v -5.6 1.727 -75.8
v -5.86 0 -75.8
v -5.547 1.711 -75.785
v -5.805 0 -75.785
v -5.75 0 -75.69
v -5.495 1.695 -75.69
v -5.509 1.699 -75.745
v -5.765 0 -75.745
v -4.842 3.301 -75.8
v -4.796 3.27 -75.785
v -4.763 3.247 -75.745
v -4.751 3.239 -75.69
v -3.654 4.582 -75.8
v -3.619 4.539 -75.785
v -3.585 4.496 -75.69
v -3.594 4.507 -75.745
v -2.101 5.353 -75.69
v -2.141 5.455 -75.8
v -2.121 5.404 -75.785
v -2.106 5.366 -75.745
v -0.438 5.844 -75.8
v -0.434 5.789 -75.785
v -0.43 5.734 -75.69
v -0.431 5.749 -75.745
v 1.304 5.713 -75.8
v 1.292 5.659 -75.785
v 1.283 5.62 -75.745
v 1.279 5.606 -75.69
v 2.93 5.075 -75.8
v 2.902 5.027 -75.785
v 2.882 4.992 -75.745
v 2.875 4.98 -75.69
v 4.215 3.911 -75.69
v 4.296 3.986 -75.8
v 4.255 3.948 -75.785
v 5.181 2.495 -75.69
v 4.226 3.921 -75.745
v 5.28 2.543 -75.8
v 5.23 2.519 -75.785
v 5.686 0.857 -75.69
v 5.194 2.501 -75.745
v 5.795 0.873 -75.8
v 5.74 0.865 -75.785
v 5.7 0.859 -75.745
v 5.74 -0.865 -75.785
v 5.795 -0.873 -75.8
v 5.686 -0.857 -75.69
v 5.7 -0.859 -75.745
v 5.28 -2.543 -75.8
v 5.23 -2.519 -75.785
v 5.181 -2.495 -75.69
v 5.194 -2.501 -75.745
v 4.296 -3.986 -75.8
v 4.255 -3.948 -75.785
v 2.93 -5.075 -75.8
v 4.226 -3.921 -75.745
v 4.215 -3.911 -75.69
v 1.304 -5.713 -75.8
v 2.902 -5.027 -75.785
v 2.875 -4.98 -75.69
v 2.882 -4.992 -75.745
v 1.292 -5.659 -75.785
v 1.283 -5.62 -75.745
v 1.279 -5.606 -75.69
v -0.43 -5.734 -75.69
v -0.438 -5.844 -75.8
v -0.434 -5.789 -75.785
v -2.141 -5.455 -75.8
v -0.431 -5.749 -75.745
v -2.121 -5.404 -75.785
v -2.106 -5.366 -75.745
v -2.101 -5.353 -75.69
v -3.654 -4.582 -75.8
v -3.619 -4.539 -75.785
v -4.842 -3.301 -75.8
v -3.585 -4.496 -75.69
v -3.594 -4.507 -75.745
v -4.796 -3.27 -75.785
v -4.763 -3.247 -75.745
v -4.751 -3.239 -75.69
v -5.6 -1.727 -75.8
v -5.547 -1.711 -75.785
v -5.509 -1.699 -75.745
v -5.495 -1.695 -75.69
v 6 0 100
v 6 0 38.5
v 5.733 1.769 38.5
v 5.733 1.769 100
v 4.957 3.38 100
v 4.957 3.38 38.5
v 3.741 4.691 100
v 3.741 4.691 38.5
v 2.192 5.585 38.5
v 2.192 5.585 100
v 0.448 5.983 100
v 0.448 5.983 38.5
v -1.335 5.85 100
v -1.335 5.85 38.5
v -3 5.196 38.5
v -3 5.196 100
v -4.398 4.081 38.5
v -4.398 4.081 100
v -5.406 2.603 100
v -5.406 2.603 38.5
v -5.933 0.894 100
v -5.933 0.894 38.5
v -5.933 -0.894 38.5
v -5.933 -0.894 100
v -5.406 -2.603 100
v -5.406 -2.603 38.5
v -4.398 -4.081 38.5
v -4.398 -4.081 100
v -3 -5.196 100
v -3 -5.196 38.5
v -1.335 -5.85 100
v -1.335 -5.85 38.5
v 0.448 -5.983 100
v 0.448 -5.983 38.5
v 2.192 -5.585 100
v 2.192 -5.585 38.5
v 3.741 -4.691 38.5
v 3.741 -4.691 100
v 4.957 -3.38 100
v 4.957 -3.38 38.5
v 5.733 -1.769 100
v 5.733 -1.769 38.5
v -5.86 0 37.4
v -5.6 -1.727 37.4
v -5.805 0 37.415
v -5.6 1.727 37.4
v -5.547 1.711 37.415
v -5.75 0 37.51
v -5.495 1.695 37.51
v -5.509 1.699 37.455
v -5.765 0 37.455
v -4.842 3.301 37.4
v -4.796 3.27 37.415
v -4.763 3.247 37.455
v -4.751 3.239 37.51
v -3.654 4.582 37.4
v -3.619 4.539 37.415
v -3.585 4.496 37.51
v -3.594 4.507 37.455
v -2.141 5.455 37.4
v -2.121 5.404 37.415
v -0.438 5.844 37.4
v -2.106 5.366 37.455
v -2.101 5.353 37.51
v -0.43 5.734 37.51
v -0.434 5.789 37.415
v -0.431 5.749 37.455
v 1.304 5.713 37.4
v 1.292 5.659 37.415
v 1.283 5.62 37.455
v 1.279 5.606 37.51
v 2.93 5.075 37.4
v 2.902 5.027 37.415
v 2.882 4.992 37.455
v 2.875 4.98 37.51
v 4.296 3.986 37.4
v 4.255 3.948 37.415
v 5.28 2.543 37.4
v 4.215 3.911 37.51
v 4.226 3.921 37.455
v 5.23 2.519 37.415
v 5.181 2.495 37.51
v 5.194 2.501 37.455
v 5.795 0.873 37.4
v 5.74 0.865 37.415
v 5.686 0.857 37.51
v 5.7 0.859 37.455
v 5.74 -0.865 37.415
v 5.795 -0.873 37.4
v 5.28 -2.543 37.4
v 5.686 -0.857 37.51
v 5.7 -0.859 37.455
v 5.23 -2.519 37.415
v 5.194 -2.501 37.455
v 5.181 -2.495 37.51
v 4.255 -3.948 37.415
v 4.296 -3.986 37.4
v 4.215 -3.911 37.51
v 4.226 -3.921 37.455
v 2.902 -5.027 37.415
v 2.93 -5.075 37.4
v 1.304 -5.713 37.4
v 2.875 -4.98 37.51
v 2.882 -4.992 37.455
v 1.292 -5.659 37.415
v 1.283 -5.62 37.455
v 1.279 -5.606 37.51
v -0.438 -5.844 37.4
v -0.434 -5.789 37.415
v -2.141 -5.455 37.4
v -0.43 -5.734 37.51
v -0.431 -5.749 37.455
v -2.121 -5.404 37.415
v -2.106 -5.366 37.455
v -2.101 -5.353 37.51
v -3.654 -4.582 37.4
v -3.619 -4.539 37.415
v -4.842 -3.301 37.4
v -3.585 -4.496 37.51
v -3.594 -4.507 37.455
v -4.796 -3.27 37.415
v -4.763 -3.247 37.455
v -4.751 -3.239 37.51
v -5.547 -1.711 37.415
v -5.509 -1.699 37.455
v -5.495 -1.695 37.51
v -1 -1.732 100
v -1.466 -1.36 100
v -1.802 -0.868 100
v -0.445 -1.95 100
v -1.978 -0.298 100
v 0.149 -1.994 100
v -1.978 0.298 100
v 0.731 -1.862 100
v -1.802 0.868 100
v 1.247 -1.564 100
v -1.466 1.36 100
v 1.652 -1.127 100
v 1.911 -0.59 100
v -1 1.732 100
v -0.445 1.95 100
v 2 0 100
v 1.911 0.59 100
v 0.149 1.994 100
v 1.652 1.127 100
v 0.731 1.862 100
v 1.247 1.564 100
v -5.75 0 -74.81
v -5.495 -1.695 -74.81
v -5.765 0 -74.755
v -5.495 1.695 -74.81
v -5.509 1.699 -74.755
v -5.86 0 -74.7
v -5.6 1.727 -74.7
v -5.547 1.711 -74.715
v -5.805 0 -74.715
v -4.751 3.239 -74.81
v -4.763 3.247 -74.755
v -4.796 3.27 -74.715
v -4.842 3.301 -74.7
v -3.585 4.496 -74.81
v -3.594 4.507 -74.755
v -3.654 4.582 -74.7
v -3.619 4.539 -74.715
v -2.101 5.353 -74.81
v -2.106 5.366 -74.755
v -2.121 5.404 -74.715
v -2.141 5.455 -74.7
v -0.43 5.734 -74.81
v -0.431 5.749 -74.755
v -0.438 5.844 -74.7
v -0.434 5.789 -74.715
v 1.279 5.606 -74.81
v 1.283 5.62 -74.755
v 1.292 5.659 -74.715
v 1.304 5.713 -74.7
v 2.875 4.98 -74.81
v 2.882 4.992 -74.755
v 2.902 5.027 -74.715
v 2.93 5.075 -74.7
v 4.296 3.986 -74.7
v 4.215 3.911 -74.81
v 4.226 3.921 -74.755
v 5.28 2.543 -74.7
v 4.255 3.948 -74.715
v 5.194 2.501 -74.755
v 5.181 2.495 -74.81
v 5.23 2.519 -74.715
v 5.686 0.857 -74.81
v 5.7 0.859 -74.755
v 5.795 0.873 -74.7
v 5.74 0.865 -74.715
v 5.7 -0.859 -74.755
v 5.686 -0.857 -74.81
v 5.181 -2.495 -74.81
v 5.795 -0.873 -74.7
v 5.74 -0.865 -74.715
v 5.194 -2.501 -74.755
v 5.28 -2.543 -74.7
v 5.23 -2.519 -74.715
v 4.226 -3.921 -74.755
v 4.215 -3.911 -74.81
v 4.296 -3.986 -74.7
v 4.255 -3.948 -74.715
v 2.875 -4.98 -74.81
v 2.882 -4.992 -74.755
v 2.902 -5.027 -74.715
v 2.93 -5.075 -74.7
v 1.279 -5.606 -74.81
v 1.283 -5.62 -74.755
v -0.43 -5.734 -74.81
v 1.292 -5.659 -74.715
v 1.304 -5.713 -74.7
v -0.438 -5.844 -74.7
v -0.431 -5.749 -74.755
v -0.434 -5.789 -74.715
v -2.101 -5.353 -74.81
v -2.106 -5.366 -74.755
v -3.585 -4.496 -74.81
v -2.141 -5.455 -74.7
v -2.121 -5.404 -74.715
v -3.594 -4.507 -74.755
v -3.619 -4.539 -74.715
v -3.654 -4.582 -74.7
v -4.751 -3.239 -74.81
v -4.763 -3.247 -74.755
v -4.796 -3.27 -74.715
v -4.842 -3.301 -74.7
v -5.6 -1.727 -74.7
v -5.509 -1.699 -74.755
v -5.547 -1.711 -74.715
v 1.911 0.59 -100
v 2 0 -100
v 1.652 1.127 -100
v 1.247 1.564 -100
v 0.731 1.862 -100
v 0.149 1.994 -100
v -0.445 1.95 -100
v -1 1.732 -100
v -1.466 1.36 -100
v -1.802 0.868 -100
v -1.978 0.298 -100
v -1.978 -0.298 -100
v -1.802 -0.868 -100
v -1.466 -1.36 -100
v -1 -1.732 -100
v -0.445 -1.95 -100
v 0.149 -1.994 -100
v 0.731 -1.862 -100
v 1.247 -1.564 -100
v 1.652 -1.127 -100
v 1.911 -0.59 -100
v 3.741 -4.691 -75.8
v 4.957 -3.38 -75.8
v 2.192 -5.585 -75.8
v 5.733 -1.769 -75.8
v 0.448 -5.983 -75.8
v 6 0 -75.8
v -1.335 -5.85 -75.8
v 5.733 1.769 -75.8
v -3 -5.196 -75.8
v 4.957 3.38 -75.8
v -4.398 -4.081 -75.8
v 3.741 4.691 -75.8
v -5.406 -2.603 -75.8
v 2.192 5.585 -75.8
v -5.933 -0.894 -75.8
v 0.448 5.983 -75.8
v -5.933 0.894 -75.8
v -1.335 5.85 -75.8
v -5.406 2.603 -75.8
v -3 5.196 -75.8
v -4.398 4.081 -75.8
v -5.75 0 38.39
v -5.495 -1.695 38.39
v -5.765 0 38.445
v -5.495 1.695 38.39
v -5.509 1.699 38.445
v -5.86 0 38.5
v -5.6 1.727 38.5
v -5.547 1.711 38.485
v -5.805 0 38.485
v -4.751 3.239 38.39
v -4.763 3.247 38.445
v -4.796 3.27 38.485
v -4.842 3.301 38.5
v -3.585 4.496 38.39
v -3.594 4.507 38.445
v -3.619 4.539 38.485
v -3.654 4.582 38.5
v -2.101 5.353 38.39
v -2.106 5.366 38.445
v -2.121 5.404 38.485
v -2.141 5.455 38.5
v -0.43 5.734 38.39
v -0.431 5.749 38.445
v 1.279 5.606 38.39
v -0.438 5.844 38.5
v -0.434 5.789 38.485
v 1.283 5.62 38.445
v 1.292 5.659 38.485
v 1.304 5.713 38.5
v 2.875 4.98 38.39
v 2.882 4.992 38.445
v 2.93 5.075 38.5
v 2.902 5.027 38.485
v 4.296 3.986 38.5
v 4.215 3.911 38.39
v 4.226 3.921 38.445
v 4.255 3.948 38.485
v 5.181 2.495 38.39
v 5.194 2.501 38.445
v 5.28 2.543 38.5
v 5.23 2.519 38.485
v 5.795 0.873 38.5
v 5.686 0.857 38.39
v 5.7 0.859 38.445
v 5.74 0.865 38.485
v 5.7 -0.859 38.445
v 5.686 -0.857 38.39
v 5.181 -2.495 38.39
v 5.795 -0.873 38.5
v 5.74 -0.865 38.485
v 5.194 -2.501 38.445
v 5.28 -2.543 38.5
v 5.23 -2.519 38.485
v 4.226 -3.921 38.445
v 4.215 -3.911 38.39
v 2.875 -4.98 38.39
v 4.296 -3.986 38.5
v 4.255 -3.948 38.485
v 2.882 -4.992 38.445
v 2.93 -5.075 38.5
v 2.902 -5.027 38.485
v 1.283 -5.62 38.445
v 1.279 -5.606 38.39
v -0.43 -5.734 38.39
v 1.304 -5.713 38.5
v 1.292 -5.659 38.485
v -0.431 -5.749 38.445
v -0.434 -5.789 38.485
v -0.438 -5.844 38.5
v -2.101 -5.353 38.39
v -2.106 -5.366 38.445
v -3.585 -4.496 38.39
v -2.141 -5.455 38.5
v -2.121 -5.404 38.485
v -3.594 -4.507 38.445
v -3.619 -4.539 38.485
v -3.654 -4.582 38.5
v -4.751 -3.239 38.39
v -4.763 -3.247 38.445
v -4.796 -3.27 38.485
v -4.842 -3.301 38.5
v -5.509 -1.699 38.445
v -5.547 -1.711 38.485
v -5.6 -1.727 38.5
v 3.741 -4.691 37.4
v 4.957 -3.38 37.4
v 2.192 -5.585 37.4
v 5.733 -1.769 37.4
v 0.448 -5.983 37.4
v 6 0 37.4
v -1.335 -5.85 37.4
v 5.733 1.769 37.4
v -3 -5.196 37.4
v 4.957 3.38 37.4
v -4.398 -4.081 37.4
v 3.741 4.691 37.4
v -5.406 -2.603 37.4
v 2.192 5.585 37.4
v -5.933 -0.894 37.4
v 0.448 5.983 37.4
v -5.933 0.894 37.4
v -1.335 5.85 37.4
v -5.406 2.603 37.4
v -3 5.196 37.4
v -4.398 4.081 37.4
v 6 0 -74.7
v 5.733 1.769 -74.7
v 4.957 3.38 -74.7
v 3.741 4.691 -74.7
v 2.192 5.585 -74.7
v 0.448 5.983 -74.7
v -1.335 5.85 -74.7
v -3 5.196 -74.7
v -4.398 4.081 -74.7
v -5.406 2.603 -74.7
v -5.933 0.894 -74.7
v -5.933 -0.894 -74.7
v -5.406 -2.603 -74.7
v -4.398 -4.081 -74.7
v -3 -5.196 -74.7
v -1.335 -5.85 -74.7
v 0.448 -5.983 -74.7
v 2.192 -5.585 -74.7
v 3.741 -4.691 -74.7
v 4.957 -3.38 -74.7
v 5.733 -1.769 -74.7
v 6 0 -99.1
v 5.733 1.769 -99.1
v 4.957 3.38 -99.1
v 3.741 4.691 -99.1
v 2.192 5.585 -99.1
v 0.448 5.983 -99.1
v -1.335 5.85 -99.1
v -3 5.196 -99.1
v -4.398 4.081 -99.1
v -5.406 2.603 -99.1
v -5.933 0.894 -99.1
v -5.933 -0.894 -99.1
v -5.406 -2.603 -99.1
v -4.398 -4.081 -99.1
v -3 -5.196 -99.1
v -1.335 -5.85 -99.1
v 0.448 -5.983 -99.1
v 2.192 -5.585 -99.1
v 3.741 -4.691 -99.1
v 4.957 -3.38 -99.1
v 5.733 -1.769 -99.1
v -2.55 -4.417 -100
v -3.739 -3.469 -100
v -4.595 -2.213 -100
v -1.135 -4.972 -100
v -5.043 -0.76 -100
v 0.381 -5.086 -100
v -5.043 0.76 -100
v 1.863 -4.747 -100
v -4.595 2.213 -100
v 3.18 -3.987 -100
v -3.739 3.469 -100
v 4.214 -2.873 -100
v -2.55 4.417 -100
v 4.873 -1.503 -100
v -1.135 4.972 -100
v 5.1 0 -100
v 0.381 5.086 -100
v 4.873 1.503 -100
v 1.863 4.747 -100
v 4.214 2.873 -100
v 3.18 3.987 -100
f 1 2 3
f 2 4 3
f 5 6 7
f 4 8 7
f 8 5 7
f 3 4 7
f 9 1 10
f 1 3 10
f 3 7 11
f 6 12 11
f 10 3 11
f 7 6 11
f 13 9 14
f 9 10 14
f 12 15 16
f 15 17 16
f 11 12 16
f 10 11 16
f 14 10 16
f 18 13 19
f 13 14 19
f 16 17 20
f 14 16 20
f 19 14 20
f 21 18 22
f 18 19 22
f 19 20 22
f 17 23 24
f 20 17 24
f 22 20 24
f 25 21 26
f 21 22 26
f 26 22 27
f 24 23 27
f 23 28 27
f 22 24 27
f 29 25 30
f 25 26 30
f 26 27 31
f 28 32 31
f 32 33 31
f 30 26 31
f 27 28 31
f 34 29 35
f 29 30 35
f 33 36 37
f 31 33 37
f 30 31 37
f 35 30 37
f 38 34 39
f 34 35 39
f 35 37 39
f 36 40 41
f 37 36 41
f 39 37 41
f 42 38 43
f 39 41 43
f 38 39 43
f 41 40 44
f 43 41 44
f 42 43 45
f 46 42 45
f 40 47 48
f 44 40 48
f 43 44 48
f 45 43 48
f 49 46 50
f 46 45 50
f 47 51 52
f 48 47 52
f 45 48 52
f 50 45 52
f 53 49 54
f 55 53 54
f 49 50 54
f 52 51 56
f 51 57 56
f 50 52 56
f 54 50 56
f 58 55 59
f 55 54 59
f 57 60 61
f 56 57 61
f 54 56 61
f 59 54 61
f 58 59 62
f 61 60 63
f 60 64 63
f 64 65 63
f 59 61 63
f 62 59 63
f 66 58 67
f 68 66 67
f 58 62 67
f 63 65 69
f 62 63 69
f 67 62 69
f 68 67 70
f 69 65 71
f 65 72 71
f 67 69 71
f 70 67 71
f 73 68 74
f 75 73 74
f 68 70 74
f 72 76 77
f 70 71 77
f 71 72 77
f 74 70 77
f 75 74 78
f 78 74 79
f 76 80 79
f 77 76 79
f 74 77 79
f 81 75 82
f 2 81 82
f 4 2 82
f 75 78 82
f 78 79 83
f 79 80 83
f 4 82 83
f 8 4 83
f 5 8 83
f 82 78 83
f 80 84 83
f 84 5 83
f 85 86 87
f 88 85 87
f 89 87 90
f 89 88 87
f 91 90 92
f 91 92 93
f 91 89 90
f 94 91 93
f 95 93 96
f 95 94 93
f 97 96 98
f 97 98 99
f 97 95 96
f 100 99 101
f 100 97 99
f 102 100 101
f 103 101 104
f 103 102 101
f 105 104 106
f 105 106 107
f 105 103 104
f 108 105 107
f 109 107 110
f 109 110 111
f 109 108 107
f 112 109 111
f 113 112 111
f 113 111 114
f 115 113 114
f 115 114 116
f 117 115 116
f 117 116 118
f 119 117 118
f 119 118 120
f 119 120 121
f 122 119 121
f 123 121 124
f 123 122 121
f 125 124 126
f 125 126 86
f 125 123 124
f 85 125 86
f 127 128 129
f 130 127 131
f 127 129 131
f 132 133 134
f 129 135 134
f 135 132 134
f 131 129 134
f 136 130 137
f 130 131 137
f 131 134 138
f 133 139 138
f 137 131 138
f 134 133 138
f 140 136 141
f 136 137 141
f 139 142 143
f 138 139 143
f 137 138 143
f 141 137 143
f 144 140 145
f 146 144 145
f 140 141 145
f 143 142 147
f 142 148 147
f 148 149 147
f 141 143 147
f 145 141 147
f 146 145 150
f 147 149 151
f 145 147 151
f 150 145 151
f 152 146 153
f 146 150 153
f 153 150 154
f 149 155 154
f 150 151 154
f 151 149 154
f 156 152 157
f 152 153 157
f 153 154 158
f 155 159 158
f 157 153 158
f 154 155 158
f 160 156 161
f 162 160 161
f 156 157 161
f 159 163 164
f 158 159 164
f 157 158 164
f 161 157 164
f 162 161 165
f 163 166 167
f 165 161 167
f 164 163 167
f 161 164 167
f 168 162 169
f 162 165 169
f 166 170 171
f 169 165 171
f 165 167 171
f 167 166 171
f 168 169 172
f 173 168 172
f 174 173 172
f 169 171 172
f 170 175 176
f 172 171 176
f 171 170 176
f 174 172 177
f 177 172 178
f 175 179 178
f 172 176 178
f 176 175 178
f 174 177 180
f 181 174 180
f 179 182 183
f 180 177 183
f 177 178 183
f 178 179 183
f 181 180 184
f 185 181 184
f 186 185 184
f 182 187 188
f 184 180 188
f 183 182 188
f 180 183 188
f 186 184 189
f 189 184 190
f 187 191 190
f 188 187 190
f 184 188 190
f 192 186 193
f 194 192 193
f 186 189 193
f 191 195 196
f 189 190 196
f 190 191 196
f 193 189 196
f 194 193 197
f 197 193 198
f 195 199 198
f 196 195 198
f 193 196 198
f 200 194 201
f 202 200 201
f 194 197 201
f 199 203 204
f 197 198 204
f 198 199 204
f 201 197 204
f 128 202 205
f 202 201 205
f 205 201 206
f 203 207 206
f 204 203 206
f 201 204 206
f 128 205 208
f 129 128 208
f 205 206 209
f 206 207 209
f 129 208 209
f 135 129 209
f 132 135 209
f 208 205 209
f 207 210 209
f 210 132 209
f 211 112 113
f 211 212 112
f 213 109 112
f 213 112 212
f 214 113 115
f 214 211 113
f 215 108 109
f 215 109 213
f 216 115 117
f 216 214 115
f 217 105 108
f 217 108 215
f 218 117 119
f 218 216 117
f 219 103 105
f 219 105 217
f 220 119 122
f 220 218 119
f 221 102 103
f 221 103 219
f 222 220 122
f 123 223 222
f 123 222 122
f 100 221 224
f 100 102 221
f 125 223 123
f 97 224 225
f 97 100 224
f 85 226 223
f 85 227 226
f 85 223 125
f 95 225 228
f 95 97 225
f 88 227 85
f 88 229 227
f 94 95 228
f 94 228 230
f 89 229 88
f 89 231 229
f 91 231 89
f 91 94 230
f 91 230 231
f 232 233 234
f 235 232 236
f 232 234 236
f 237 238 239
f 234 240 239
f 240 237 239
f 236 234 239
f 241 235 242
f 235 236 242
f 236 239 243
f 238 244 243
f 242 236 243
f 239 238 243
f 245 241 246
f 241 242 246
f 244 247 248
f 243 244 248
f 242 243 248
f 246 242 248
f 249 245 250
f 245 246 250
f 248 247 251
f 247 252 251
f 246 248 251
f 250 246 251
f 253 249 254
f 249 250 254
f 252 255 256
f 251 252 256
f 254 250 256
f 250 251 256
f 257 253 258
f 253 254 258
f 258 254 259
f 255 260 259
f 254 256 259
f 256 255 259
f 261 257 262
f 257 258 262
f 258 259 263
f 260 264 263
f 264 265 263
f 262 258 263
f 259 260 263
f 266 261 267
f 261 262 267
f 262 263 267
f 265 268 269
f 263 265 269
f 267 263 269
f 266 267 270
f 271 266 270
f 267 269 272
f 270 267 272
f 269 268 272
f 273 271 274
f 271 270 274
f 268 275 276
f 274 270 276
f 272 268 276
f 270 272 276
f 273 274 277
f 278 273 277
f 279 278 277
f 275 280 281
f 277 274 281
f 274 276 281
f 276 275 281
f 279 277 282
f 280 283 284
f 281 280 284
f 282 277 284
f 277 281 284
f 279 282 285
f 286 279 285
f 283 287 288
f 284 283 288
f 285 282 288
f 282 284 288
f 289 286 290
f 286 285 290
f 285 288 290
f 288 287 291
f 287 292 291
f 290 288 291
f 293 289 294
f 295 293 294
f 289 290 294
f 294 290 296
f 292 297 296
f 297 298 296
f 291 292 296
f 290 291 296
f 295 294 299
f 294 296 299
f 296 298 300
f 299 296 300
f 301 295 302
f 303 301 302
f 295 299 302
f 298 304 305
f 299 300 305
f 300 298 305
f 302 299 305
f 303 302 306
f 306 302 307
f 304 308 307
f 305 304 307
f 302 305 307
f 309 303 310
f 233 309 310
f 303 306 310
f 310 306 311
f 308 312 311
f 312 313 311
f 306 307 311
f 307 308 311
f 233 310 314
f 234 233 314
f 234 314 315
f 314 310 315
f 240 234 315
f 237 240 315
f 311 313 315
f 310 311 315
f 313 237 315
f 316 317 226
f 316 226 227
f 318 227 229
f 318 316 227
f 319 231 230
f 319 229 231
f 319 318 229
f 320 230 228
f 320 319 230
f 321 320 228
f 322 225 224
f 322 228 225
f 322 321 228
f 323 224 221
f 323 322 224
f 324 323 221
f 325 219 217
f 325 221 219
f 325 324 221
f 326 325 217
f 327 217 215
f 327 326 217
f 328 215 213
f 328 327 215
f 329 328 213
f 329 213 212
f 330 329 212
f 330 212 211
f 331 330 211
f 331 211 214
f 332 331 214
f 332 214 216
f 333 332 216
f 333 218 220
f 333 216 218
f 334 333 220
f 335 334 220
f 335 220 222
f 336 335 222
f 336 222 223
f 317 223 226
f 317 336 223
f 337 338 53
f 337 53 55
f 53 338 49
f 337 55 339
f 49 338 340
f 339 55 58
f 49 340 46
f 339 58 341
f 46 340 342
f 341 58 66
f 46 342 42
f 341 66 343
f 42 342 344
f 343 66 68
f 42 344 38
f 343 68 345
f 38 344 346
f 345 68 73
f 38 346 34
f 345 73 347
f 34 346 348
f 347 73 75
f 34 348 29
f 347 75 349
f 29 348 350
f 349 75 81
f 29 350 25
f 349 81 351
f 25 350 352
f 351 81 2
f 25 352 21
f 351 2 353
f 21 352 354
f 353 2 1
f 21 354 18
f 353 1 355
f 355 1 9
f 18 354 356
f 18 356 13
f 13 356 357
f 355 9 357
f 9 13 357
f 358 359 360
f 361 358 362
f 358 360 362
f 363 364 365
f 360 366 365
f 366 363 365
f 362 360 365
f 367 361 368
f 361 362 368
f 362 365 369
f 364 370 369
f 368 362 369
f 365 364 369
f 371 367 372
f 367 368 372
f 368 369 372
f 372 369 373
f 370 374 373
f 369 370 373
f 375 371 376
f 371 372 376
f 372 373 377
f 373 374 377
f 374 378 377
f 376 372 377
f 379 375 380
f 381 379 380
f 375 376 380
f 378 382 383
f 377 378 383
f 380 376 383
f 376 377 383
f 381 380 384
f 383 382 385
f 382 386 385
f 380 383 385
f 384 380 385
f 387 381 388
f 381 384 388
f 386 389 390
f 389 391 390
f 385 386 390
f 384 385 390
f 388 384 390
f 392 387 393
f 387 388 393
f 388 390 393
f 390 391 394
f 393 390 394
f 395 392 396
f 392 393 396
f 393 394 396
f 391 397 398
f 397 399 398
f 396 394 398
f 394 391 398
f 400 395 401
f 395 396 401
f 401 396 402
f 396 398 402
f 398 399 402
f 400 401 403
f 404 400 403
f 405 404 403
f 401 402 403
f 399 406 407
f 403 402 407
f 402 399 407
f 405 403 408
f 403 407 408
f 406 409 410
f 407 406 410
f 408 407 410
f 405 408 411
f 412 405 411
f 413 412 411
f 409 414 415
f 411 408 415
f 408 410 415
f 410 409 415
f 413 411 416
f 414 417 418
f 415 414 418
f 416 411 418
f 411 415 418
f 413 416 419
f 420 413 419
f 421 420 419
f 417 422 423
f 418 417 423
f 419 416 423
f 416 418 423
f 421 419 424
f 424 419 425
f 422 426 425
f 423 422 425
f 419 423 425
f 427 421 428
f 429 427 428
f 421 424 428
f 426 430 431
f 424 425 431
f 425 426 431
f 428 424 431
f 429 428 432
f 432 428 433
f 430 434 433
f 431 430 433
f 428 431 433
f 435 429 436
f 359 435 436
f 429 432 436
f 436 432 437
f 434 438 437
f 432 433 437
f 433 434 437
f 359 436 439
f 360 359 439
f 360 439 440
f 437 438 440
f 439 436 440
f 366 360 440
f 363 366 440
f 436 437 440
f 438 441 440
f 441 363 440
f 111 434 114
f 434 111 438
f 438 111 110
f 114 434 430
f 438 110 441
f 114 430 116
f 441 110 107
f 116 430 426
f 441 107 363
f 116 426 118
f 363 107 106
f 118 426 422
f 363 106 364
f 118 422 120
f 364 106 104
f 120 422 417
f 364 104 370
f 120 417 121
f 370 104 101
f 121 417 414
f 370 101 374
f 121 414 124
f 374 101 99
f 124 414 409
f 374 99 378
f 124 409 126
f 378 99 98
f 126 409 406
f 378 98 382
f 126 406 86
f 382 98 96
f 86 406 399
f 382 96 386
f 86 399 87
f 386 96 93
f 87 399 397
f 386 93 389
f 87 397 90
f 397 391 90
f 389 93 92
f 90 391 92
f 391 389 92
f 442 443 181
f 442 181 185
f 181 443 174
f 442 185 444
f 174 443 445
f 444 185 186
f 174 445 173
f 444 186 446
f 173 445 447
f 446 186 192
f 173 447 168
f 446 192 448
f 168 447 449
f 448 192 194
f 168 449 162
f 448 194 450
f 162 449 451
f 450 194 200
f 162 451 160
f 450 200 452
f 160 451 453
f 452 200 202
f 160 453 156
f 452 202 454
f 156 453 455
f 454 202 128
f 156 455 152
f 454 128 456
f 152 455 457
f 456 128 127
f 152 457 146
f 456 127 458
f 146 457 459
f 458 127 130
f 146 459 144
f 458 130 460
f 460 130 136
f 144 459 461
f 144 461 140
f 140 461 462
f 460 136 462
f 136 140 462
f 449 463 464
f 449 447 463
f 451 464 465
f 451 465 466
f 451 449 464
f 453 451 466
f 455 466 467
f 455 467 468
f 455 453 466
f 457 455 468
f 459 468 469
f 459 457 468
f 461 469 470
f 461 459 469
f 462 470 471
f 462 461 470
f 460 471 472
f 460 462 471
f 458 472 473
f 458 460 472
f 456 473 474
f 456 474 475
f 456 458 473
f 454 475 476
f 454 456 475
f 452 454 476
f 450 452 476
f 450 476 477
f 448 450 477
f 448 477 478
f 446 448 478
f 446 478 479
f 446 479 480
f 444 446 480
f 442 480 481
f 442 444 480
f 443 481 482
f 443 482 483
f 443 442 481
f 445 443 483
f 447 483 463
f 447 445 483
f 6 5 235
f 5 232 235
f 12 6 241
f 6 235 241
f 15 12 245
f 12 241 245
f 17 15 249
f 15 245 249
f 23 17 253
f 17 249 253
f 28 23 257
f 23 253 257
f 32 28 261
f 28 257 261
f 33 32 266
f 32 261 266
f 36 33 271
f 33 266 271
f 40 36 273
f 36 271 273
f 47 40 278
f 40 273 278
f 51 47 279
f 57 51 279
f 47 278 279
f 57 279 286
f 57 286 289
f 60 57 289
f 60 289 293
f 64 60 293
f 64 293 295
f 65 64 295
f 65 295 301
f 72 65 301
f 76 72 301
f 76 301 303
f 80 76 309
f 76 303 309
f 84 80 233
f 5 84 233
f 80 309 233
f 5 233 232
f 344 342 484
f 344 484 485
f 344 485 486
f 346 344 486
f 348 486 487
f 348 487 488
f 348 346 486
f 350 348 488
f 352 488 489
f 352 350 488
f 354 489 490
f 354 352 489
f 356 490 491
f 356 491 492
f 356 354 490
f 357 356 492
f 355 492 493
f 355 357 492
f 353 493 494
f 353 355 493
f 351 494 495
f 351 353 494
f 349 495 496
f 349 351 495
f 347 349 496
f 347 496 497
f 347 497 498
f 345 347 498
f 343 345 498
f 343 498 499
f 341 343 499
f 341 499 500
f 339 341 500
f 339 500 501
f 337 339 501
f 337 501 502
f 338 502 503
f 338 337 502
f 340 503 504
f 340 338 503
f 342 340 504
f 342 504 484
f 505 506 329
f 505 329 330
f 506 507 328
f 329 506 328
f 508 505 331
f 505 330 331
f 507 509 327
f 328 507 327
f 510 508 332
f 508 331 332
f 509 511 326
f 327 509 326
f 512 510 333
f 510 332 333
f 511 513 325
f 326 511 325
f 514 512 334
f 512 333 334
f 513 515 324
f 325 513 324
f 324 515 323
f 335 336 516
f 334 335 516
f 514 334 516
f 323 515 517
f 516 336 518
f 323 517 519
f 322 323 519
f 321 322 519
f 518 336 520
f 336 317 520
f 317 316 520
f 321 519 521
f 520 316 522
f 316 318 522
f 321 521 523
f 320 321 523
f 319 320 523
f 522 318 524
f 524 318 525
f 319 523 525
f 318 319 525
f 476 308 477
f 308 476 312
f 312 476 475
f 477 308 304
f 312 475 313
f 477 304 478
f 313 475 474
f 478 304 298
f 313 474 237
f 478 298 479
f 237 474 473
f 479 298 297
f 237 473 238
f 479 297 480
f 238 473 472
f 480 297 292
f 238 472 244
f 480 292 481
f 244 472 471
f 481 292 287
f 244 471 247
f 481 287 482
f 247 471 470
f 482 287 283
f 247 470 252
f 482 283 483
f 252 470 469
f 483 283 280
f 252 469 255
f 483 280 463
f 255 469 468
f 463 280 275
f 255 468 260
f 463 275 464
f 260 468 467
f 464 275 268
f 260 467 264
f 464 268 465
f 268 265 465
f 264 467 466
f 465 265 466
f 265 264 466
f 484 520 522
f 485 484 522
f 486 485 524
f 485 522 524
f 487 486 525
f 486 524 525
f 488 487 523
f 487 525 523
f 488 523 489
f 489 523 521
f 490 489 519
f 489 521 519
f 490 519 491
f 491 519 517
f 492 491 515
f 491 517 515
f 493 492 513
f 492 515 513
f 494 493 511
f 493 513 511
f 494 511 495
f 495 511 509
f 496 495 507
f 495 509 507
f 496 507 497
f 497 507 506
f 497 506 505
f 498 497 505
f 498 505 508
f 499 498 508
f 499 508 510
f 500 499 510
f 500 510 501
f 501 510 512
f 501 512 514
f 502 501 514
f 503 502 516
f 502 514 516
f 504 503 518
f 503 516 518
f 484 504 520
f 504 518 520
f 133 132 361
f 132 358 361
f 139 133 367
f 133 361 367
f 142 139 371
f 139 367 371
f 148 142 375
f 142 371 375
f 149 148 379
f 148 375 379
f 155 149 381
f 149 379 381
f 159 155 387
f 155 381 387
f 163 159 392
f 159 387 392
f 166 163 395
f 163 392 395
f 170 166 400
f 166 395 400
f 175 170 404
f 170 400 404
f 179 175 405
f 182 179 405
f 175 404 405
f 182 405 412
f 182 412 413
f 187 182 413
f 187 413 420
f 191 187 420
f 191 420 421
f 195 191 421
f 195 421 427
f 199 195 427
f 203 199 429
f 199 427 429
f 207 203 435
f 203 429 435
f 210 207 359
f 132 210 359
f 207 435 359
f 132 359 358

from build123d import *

# Parameters (mm, degrees)
SKETCH1_R           = 6
EXTRUDE1_DEPTH      = 100
CHAMFER1_SIZE       = 0.9
EXTRUDE3_DEPTH      = 101.359354322
EXTRUDE3_DEPTH_BACK = 101.359354322
SKETCH2_R           = 2


with BuildPart() as part:
    # Sketch1 → Extrude1 (new, symmetric)
    with BuildSketch(Plane.XY):
        Circle(SKETCH1_R)
    extrude(amount=EXTRUDE1_DEPTH, both=True)

    # Chamfer1
    chamfer1_edges = [part.edges().sort_by_distance(p)[0] for p in [
        (-6, 0, -100),
    ]]
    chamfer(chamfer1_edges, length=CHAMFER1_SIZE)

    # Sketch2 → Extrude3 (cut, two sides: drawn at the far end of the back side and taken through both)
    with BuildSketch(Plane.XY.offset(-EXTRUDE3_DEPTH_BACK)):
        Circle(SKETCH2_R)
    extrude(amount=EXTRUDE3_DEPTH + EXTRUDE3_DEPTH_BACK, mode=Mode.SUBTRACT)

    # Sketch5 → Groove for DIN 471 - 12 x 1_ Circlip for (revolve, cut)
    with BuildSketch(Plane(origin=(0, 0, 100), x_dir=(0, 1, 0), z_dir=(-1, 0, 0)), mode=Mode.PRIVATE) as groove_for_din_471_12_x_1_circlip_for_sk:
        with BuildLine():
            Line((5.86, 61.5), (7.2, 61.5))
            Line((7.2, 61.5), (7.2, 62.6))
            Line((7.2, 62.6), (5.86, 62.6))
            ThreePointArc((5.86, 62.6), (5.782218254, 62.567781746), (5.75, 62.49))
            Line((5.75, 62.49), (5.75, 61.61))
            ThreePointArc((5.75, 61.61), (5.782218254, 61.532218254), (5.86, 61.5))
        make_face()
    revolve(groove_for_din_471_12_x_1_circlip_for_sk.sketch.rotate(Axis((0, 0, 150), (0, 0, -1)), 270), axis=Axis((0, 0, 150), (0, 0, -1)), mode=Mode.SUBTRACT)

    # Sketch13 → Groove for DIN 471 - 12 x 1_ Circlip 2 (revolve, cut)
    with BuildSketch(Plane(origin=(0, 0, 100), x_dir=(0, 1, 0), z_dir=(-1, 0, 0)), mode=Mode.PRIVATE) as groove_for_din_471_12_x_1_circlip_2_sk:
        with BuildLine():
            Line((5.86, 174.7), (7.2, 174.7))
            Line((7.2, 174.7), (7.2, 175.8))
            Line((7.2, 175.8), (5.86, 175.8))
            ThreePointArc((5.86, 175.8), (5.782218254, 175.767781746), (5.75, 175.69))
            Line((5.75, 175.69), (5.75, 174.81))
            ThreePointArc((5.75, 174.81), (5.782218254, 174.732218254), (5.86, 174.7))
        make_face()
    revolve(groove_for_din_471_12_x_1_circlip_2_sk.sketch.rotate(Axis((0, 0, 150), (0, 0, -1)), 270), axis=Axis((0, 0, 150), (0, 0, -1)), mode=Mode.SUBTRACT)


solid = part.part
